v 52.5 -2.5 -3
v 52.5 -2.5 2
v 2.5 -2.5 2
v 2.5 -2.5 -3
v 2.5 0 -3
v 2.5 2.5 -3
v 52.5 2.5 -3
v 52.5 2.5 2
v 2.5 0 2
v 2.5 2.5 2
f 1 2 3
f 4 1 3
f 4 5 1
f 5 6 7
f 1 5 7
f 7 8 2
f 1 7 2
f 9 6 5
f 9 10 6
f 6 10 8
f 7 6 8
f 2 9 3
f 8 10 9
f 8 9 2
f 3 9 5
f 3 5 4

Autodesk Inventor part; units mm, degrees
ref_plane "YZ Plane" through (0, 0, 0) normal (1, 0, 0) x (0, 1, 0)
sketch "Sketch1" plane through (0, 0, 0) normal (0, 0, 1) x (1, 0, 0)
  line L0 (2.5, 2.5) -> (52.5, 2.5)
  line L1 (52.5, 2.5) -> (52.5, -2.5)
  line L2 (52.5, -2.5) -> (2.5, -2.5)
  arc A0 (2.5, 2.5) -> (2.5, -2.5) centre (2.5, 0) ccw construction
  line L3 (0, 7) -> (0, -7) projected
  line L4 (-6, 0) -> (36, 0) projected
  line L5 (2.5, 2.5) -> (2.5, -2.5)
  dimension "d0" = 2.5
  dimension "d13" = 50
ref_plane "Work Plane1" through (0, 0, -3) normal (0, 0, 1) x (1, 0, 0)
ref_plane "Work Plane2" through (0, 0, 2) normal (0, 0, 1) x (1, 0, 0)
extrude "Body1" add sketch "Sketch1" against normal up to surface (5 mm away) from surface at 2
equation "\"d0\" = 0.5 * PB"
equation "\"d13\" = NLG"
equation "\"d1\" = -PNT"
equation "\"d2\" = PH - PNT"
equation "\"NLG\" = 50"
equation "\"PB\" = 5"
equation "\"PNT\" = 3"
equation "\"PH\" = 5"
equation "\"PHH\" = 0"
equation "\"RR\" = 0.001"
equation "\"WDMIN\" = 12"
equation "\"WDMAX\" = 17"
equation "\"PLB1\" = 52.5"
equation "\"PLB2\" = 55"
equation "\"PUEB\" = 2.3"
properties part number "DIN 6885 - B 5 x 5 x 50" material "Steel, Mild"
